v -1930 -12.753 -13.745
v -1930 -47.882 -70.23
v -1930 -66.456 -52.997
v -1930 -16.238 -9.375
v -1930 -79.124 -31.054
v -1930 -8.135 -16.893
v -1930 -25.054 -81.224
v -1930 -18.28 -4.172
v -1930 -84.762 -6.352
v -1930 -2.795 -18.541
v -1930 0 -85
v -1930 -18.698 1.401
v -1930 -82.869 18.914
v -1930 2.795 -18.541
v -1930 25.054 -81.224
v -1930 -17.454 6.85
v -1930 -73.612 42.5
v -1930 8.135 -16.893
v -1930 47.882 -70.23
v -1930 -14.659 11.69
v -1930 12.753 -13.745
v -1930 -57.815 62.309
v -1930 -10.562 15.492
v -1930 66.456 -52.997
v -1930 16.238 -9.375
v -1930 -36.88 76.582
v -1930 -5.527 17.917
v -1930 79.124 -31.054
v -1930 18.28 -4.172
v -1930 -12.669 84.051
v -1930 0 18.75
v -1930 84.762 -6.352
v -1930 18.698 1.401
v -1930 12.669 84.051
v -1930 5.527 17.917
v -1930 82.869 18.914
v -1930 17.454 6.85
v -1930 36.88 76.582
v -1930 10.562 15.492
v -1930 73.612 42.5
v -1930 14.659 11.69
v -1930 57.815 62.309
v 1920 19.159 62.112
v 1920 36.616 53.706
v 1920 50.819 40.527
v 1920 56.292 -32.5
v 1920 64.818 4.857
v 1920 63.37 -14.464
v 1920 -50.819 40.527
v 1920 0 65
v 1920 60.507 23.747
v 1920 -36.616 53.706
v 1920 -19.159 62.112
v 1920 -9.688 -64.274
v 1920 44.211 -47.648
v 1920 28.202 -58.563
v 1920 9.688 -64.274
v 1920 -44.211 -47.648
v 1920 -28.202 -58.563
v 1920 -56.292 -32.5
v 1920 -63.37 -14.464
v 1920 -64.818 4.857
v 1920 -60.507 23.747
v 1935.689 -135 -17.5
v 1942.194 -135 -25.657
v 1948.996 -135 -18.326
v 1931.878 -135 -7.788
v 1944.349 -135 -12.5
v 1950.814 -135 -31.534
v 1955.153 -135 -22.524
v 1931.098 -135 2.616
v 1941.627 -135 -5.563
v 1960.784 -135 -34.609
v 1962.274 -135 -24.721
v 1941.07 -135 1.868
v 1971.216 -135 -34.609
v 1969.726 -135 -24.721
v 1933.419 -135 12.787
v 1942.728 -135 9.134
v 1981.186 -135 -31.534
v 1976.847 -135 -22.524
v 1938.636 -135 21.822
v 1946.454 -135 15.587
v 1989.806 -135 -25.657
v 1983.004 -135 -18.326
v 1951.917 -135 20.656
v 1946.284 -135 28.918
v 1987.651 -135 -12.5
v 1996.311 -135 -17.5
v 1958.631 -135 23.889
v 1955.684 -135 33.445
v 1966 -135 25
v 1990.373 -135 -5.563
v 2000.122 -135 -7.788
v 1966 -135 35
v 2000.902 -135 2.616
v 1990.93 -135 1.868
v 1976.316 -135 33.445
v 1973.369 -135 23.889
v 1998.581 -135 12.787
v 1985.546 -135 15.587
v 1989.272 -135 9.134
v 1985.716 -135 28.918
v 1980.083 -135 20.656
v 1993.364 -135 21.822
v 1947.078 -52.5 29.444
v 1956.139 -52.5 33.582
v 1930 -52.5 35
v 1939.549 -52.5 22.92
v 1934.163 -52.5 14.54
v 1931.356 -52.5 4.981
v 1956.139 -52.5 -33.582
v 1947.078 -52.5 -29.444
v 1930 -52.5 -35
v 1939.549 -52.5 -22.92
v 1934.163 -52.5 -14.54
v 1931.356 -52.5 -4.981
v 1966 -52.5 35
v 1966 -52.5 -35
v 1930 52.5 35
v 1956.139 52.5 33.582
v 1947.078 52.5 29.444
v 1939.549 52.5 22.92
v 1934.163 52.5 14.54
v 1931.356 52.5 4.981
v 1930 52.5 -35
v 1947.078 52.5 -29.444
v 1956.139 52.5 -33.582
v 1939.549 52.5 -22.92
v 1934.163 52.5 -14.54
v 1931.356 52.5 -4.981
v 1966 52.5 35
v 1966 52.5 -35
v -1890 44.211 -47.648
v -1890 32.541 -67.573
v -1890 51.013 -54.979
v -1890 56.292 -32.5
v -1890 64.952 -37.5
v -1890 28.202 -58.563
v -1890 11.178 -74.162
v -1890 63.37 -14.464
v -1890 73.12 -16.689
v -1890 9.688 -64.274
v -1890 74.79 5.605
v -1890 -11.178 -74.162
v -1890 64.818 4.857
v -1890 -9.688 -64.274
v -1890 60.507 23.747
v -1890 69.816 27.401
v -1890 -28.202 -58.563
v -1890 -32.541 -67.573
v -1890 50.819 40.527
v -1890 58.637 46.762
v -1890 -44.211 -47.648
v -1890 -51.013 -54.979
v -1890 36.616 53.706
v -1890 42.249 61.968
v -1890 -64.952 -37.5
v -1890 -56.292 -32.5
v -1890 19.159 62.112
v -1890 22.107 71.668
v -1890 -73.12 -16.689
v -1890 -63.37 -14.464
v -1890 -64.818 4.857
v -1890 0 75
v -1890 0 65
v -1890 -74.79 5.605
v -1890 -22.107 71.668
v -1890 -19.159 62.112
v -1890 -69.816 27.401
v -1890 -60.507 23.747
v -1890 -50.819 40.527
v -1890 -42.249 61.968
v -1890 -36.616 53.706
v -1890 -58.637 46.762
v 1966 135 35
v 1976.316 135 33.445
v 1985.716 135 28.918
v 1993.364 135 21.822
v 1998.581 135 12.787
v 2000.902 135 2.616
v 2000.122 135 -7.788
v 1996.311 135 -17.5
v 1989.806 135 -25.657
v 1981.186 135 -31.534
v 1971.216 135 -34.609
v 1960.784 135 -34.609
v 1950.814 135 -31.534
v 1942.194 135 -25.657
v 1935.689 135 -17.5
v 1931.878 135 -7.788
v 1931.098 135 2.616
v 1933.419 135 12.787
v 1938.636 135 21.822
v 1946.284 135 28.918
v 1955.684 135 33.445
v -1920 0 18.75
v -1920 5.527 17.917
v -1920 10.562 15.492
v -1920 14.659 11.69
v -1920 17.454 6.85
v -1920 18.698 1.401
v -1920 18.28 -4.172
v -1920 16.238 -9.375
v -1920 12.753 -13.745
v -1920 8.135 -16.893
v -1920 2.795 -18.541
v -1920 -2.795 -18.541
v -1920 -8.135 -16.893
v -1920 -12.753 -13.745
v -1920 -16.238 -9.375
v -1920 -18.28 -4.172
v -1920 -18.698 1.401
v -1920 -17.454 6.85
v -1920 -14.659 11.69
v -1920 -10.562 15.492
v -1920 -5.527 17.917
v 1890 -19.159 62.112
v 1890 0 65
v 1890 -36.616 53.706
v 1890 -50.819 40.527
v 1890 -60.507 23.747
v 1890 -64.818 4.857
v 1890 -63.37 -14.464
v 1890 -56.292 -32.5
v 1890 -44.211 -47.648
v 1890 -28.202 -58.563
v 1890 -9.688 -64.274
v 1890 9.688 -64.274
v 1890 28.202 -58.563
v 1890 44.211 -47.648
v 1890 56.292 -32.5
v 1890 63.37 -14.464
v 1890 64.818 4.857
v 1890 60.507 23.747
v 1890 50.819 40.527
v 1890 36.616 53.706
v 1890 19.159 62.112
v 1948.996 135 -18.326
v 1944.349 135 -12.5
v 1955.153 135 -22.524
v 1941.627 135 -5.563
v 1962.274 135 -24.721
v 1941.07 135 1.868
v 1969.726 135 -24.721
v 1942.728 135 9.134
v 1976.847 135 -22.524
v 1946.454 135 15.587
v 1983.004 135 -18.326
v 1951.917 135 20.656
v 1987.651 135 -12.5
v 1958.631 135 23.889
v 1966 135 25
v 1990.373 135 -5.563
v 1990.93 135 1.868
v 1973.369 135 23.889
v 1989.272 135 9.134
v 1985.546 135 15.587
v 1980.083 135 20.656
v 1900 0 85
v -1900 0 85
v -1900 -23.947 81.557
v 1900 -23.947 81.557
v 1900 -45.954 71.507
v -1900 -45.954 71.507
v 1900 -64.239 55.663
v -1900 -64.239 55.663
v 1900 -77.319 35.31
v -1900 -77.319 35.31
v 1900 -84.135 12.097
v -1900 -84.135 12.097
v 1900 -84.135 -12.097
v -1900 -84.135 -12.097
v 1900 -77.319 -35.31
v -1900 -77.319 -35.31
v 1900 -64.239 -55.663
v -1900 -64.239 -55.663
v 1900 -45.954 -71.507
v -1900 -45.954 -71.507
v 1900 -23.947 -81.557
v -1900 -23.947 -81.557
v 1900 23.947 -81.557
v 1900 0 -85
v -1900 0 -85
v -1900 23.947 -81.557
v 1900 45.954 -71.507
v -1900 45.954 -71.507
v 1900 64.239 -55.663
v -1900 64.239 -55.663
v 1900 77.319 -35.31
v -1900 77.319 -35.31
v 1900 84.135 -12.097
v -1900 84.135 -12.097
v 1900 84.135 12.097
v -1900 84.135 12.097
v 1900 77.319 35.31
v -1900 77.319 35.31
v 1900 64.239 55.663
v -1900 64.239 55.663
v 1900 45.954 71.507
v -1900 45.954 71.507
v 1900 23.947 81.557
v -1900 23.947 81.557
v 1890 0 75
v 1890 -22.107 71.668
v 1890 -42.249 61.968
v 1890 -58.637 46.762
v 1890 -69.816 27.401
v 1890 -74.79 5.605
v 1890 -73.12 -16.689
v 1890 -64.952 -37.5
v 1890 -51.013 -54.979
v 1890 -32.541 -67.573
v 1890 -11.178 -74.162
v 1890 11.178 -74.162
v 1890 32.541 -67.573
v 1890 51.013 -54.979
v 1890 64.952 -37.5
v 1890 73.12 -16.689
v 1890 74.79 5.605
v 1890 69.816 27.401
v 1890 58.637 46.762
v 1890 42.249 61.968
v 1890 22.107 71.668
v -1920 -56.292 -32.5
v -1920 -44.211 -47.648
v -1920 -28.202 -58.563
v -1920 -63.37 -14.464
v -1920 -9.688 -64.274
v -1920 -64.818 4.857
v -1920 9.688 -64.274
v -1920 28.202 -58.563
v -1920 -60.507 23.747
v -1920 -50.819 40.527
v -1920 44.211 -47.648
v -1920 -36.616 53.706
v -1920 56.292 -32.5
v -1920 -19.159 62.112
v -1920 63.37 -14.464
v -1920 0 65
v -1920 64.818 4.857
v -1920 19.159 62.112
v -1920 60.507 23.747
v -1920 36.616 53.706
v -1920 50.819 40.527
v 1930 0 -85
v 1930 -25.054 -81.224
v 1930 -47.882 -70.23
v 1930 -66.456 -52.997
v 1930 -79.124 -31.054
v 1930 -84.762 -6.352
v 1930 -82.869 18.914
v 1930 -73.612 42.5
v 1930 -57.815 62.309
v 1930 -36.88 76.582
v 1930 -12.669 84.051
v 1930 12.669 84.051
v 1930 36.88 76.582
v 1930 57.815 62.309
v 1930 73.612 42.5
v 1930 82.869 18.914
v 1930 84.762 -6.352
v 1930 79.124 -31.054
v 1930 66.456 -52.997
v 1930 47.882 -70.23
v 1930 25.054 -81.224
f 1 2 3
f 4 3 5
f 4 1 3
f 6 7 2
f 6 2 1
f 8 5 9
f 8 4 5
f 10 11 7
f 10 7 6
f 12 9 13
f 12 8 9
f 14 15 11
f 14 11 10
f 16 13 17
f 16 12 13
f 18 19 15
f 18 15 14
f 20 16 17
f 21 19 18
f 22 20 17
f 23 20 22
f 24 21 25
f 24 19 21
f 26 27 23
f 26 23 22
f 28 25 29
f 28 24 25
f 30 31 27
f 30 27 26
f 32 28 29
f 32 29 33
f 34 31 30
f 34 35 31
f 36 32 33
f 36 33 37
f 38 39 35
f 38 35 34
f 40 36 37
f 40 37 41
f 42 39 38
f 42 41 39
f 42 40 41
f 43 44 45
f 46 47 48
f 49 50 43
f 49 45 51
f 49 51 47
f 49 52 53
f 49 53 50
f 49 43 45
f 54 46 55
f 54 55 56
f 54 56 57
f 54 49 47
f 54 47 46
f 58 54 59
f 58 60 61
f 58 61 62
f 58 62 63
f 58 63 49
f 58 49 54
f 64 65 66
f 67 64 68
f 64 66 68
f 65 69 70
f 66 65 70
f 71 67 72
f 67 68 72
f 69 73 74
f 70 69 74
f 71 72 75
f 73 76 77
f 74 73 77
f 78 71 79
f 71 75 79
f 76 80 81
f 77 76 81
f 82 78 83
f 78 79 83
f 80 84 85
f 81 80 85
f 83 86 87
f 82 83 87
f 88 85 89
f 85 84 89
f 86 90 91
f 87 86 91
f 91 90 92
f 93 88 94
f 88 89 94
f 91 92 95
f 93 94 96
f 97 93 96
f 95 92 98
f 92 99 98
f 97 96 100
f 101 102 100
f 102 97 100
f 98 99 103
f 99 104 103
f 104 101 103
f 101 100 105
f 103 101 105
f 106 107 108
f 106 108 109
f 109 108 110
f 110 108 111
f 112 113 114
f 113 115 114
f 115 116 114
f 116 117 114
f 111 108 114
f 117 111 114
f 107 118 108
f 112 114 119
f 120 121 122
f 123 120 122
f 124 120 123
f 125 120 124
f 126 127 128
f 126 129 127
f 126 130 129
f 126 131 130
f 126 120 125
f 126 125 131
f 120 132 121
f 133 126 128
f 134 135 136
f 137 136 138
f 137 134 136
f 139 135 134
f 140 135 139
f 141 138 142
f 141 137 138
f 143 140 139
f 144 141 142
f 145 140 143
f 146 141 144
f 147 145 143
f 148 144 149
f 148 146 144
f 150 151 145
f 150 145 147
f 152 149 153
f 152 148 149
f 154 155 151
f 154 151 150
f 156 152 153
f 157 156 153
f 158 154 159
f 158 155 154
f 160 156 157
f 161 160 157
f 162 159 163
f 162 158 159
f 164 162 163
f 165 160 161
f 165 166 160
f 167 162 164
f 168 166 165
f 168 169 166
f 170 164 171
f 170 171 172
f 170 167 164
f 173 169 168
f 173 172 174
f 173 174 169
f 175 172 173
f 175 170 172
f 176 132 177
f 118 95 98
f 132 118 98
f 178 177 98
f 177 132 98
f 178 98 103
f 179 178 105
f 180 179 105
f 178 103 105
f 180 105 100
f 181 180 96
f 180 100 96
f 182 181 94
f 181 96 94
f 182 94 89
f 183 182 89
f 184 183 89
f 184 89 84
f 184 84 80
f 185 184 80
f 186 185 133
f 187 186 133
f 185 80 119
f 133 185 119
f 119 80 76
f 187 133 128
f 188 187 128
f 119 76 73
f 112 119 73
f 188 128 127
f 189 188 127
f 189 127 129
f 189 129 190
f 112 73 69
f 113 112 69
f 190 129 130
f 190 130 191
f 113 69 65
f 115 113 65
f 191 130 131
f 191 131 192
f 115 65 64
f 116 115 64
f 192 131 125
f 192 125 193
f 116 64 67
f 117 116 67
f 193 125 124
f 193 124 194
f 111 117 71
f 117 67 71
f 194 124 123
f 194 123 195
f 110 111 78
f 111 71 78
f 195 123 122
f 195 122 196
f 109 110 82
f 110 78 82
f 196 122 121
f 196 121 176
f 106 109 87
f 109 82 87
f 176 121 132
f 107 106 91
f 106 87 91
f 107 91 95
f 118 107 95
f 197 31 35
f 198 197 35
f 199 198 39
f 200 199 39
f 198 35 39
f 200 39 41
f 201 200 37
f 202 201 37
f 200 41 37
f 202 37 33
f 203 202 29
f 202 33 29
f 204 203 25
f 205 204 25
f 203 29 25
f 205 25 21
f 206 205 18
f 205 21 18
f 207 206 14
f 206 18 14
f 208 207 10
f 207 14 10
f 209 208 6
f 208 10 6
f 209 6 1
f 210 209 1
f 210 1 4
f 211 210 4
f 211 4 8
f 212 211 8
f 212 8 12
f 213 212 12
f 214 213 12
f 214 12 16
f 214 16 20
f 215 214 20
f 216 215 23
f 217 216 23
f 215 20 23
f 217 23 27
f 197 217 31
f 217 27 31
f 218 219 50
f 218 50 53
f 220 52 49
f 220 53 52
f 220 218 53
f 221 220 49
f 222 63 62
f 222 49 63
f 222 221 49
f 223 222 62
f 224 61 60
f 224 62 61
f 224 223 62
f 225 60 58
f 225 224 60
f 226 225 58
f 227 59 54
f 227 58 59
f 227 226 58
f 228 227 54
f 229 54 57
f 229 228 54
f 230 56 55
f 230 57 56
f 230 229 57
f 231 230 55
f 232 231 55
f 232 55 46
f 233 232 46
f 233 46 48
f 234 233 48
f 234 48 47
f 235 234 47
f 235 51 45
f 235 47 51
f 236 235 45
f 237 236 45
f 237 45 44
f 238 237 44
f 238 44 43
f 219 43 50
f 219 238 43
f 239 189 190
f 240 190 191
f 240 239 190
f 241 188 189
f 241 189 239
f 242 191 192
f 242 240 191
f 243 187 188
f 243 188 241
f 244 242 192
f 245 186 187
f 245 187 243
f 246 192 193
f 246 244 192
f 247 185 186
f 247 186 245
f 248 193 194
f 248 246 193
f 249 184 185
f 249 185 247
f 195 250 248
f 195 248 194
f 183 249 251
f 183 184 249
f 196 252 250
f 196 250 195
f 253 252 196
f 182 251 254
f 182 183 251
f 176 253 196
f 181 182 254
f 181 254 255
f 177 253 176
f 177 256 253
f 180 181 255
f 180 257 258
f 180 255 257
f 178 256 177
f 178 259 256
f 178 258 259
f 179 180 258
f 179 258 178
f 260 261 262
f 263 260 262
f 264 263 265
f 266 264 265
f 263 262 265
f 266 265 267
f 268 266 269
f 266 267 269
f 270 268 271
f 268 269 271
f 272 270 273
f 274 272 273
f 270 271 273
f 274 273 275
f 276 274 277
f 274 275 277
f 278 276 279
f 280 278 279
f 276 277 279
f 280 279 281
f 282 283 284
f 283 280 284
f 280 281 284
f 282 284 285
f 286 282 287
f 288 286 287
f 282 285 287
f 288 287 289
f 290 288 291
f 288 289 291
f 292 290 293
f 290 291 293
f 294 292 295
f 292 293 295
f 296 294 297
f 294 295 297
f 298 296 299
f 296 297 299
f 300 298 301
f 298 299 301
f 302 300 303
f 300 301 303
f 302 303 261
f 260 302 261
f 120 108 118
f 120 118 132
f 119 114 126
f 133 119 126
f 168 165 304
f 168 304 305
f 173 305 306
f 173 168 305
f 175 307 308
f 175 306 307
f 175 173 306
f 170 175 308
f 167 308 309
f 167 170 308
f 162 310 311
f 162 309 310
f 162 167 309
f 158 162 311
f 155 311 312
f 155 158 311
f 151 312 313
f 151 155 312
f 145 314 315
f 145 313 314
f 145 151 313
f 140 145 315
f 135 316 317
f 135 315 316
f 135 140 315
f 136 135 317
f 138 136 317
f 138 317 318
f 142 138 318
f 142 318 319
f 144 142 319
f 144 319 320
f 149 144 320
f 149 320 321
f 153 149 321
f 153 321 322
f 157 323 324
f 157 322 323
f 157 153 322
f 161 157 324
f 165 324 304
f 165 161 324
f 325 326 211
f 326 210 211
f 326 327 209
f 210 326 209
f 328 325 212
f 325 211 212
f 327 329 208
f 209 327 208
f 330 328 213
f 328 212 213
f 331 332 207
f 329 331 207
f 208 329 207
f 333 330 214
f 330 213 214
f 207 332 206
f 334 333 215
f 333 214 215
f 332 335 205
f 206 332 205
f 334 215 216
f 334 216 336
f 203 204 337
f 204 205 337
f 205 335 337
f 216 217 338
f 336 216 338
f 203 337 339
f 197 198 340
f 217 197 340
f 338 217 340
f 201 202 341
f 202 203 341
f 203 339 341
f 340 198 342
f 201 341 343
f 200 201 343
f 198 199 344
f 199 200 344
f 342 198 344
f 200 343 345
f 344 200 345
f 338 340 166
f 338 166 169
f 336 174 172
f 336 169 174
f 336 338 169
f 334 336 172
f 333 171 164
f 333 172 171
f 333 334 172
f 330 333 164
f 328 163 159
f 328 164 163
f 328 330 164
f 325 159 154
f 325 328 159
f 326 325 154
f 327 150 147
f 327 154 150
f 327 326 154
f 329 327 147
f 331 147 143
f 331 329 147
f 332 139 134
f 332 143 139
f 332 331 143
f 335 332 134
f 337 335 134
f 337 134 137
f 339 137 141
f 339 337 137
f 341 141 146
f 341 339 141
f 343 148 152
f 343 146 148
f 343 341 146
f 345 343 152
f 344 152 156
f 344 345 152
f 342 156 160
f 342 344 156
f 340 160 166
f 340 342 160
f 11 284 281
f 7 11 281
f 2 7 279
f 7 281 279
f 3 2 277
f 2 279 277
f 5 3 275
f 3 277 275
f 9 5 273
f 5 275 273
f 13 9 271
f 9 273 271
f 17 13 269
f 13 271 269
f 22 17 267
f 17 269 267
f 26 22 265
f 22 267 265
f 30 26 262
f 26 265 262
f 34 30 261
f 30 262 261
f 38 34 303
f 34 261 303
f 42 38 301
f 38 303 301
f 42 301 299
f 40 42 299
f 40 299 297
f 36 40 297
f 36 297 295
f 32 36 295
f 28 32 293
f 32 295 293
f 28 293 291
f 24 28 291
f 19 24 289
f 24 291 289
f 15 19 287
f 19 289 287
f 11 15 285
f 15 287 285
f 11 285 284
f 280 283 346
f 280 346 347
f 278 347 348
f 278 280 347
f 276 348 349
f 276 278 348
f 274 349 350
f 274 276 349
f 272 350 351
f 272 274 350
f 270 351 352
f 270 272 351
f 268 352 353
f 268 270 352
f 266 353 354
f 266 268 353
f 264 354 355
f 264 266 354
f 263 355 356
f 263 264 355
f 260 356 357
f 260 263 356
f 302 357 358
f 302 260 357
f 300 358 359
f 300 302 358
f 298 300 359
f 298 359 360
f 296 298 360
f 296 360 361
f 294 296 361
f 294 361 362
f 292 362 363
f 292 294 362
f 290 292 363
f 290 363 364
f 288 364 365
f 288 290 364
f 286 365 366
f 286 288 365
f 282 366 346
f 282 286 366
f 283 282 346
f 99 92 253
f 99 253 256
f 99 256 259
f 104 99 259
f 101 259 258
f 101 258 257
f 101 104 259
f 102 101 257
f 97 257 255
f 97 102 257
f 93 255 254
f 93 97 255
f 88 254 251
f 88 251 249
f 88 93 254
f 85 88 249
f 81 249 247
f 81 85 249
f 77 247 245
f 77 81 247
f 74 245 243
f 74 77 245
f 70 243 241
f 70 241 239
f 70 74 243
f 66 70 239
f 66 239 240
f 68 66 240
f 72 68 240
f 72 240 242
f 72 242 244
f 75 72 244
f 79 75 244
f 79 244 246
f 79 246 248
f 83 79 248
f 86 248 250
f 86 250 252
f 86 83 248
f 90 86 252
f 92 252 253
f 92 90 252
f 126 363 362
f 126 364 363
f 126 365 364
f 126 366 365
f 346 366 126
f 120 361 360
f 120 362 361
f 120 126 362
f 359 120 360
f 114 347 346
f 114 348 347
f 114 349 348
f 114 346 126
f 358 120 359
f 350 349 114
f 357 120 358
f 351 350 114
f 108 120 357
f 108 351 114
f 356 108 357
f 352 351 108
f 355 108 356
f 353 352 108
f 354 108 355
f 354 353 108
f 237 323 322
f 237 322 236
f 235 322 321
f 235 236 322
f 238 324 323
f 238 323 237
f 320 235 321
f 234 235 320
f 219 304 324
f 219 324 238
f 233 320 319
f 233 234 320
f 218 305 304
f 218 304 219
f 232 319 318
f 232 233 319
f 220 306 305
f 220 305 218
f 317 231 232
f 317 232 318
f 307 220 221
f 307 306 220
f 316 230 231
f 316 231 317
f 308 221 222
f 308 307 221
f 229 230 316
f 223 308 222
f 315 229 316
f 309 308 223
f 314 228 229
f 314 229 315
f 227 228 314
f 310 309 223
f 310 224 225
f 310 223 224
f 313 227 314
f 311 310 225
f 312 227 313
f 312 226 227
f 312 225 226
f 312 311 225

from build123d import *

# Parameters (mm, degrees)
CILINDAR_SHELL1_T                 = -10
CILINDAR_SKETCH3_W                = 30
CILINDAR_SKETCH3_H                = 10
CILINDAR_BOSS_EXTRUDE1_DEPTH      = 135
CILINDAR_BOSS_EXTRUDE1_DEPTH_BACK = 135
CILINDAR_SKETCH2_R                = 35
CILINDAR_SKETCH2_R_2              = 25
CILINDAR_BOSS_EXTRUDE7_REACH      = 3865.295
CILINDAR_BOSS_EXTRUDE7_END_RADIUS = 35
CILINDAR_SKETCH6_W                = 70
CILINDAR_SKETCH6_H                = 105
CILINDAR_SKETCH7_R                = 65
CILINDAR_SKETCH7_R_2              = 18.75
CILINDAR_BOSS_EXTRUDE8_DEPTH      = 10


with BuildPart() as part:
    # cilindar_Sketch1 → cilindar_Revolve1 (revolve)
    with BuildSketch(Plane(origin=(0, 0, 0), x_dir=(1, 0, 0), z_dir=(0, 1, 0)), mode=Mode.PRIVATE) as cilindar_revolve1_sk:
        Polygon((-1900, 75), (-1930, 75), (-1930, 0), (1930, 0), (1930, 75), (1900, 75), (1900, 85), (-1900, 85), align=None)
    revolve(cilindar_revolve1_sk.sketch.rotate(Axis((-1930, 0, 0), (1, 0, 0)), 180), axis=Axis((-1930, 0, 0), (1, 0, 0)))

    # cilindar_Shell1
    cilindar_shell1_openings = [part.faces().sort_by_distance(p)[0] for p in [
        (-1930, 0, 0),
    ]]
    offset(amount=CILINDAR_SHELL1_T, openings=cilindar_shell1_openings, kind=Kind.INTERSECTION)

    # cilindar_Sketch3 → cilindar_Revolve2 (revolve)
    with BuildSketch(Plane(origin=(0, 0, 0), x_dir=(1, 0, 0), z_dir=(0, 1, 0))):
        with Locations((-1915, 80)):
            Rectangle(CILINDAR_SKETCH3_W, CILINDAR_SKETCH3_H)
    cilindar_revolve2 = revolve(axis=Axis((1890, 0, 0), (-1, 0, 0)))

    # cilindar_Mirror2: cilindar_Revolve2 across plane
    add(cilindar_revolve2.mirror(Plane(origin=(0, 0, 0), x_dir=(0, 0, 1), z_dir=(1, 0, 0))))



with BuildPart() as body_2:
    # cilindar_Sketch2 → cilindar_Boss-Extrude1 (new, two sides: drawn at the far end of the back side and taken through both)
    with BuildSketch(Plane(origin=(0, 0, 0), x_dir=(1, 0, 0), z_dir=(0, 1, 0)).offset(-CILINDAR_BOSS_EXTRUDE1_DEPTH_BACK)):
        with Locations(Location((1966, 0, 0), (0, 0, 270))):
            Circle(CILINDAR_SKETCH2_R)
        with Locations(Location((1966, 0, 0), (0, 0, 270))):
            Circle(CILINDAR_SKETCH2_R_2, mode=Mode.SUBTRACT)
    extrude(amount=CILINDAR_BOSS_EXTRUDE1_DEPTH + CILINDAR_BOSS_EXTRUDE1_DEPTH_BACK)


with BuildPart() as part_1:
    add(part.part)

    add(body_2.part)  # cilindar_Boss-Extrude7 merges body 2
    # cilindar_Boss-Extrude7: up to this cylinder (the profile starts outside it)
    cilindar_boss_extrude7_end = Plane(origin=(1966, 0, 0), z_dir=(0, 1, 0)) * Cylinder(CILINDAR_BOSS_EXTRUDE7_END_RADIUS, 7801.59, mode=Mode.PRIVATE)
    # cilindar_Sketch6 → cilindar_Boss-Extrude7 (add, up to the surface)
    with BuildSketch(Plane(origin=(1930, 0, 0), x_dir=(0, 0, -1), z_dir=(1, 0, 0)), mode=Mode.PRIVATE) as cilindar_boss_extrude7_sk1:
        Rectangle(CILINDAR_SKETCH6_W, CILINDAR_SKETCH6_H)
    cilindar_boss_extrude7_tool1 = extrude(cilindar_boss_extrude7_sk1.sketch, amount=CILINDAR_BOSS_EXTRUDE7_REACH, mode=Mode.PRIVATE) - cilindar_boss_extrude7_end
    add(cilindar_boss_extrude7_tool1.solids().sort_by_distance((1930, 0, 0))[0])

    # cilindar_Sketch7 → cilindar_Boss-Extrude8 (add)
    with BuildSketch(Plane.ZY.offset(1930)):
        Circle(CILINDAR_SKETCH7_R)
        Circle(CILINDAR_SKETCH7_R_2, mode=Mode.SUBTRACT)
    extrude(amount=-CILINDAR_BOSS_EXTRUDE8_DEPTH)


solid = part_1.part
